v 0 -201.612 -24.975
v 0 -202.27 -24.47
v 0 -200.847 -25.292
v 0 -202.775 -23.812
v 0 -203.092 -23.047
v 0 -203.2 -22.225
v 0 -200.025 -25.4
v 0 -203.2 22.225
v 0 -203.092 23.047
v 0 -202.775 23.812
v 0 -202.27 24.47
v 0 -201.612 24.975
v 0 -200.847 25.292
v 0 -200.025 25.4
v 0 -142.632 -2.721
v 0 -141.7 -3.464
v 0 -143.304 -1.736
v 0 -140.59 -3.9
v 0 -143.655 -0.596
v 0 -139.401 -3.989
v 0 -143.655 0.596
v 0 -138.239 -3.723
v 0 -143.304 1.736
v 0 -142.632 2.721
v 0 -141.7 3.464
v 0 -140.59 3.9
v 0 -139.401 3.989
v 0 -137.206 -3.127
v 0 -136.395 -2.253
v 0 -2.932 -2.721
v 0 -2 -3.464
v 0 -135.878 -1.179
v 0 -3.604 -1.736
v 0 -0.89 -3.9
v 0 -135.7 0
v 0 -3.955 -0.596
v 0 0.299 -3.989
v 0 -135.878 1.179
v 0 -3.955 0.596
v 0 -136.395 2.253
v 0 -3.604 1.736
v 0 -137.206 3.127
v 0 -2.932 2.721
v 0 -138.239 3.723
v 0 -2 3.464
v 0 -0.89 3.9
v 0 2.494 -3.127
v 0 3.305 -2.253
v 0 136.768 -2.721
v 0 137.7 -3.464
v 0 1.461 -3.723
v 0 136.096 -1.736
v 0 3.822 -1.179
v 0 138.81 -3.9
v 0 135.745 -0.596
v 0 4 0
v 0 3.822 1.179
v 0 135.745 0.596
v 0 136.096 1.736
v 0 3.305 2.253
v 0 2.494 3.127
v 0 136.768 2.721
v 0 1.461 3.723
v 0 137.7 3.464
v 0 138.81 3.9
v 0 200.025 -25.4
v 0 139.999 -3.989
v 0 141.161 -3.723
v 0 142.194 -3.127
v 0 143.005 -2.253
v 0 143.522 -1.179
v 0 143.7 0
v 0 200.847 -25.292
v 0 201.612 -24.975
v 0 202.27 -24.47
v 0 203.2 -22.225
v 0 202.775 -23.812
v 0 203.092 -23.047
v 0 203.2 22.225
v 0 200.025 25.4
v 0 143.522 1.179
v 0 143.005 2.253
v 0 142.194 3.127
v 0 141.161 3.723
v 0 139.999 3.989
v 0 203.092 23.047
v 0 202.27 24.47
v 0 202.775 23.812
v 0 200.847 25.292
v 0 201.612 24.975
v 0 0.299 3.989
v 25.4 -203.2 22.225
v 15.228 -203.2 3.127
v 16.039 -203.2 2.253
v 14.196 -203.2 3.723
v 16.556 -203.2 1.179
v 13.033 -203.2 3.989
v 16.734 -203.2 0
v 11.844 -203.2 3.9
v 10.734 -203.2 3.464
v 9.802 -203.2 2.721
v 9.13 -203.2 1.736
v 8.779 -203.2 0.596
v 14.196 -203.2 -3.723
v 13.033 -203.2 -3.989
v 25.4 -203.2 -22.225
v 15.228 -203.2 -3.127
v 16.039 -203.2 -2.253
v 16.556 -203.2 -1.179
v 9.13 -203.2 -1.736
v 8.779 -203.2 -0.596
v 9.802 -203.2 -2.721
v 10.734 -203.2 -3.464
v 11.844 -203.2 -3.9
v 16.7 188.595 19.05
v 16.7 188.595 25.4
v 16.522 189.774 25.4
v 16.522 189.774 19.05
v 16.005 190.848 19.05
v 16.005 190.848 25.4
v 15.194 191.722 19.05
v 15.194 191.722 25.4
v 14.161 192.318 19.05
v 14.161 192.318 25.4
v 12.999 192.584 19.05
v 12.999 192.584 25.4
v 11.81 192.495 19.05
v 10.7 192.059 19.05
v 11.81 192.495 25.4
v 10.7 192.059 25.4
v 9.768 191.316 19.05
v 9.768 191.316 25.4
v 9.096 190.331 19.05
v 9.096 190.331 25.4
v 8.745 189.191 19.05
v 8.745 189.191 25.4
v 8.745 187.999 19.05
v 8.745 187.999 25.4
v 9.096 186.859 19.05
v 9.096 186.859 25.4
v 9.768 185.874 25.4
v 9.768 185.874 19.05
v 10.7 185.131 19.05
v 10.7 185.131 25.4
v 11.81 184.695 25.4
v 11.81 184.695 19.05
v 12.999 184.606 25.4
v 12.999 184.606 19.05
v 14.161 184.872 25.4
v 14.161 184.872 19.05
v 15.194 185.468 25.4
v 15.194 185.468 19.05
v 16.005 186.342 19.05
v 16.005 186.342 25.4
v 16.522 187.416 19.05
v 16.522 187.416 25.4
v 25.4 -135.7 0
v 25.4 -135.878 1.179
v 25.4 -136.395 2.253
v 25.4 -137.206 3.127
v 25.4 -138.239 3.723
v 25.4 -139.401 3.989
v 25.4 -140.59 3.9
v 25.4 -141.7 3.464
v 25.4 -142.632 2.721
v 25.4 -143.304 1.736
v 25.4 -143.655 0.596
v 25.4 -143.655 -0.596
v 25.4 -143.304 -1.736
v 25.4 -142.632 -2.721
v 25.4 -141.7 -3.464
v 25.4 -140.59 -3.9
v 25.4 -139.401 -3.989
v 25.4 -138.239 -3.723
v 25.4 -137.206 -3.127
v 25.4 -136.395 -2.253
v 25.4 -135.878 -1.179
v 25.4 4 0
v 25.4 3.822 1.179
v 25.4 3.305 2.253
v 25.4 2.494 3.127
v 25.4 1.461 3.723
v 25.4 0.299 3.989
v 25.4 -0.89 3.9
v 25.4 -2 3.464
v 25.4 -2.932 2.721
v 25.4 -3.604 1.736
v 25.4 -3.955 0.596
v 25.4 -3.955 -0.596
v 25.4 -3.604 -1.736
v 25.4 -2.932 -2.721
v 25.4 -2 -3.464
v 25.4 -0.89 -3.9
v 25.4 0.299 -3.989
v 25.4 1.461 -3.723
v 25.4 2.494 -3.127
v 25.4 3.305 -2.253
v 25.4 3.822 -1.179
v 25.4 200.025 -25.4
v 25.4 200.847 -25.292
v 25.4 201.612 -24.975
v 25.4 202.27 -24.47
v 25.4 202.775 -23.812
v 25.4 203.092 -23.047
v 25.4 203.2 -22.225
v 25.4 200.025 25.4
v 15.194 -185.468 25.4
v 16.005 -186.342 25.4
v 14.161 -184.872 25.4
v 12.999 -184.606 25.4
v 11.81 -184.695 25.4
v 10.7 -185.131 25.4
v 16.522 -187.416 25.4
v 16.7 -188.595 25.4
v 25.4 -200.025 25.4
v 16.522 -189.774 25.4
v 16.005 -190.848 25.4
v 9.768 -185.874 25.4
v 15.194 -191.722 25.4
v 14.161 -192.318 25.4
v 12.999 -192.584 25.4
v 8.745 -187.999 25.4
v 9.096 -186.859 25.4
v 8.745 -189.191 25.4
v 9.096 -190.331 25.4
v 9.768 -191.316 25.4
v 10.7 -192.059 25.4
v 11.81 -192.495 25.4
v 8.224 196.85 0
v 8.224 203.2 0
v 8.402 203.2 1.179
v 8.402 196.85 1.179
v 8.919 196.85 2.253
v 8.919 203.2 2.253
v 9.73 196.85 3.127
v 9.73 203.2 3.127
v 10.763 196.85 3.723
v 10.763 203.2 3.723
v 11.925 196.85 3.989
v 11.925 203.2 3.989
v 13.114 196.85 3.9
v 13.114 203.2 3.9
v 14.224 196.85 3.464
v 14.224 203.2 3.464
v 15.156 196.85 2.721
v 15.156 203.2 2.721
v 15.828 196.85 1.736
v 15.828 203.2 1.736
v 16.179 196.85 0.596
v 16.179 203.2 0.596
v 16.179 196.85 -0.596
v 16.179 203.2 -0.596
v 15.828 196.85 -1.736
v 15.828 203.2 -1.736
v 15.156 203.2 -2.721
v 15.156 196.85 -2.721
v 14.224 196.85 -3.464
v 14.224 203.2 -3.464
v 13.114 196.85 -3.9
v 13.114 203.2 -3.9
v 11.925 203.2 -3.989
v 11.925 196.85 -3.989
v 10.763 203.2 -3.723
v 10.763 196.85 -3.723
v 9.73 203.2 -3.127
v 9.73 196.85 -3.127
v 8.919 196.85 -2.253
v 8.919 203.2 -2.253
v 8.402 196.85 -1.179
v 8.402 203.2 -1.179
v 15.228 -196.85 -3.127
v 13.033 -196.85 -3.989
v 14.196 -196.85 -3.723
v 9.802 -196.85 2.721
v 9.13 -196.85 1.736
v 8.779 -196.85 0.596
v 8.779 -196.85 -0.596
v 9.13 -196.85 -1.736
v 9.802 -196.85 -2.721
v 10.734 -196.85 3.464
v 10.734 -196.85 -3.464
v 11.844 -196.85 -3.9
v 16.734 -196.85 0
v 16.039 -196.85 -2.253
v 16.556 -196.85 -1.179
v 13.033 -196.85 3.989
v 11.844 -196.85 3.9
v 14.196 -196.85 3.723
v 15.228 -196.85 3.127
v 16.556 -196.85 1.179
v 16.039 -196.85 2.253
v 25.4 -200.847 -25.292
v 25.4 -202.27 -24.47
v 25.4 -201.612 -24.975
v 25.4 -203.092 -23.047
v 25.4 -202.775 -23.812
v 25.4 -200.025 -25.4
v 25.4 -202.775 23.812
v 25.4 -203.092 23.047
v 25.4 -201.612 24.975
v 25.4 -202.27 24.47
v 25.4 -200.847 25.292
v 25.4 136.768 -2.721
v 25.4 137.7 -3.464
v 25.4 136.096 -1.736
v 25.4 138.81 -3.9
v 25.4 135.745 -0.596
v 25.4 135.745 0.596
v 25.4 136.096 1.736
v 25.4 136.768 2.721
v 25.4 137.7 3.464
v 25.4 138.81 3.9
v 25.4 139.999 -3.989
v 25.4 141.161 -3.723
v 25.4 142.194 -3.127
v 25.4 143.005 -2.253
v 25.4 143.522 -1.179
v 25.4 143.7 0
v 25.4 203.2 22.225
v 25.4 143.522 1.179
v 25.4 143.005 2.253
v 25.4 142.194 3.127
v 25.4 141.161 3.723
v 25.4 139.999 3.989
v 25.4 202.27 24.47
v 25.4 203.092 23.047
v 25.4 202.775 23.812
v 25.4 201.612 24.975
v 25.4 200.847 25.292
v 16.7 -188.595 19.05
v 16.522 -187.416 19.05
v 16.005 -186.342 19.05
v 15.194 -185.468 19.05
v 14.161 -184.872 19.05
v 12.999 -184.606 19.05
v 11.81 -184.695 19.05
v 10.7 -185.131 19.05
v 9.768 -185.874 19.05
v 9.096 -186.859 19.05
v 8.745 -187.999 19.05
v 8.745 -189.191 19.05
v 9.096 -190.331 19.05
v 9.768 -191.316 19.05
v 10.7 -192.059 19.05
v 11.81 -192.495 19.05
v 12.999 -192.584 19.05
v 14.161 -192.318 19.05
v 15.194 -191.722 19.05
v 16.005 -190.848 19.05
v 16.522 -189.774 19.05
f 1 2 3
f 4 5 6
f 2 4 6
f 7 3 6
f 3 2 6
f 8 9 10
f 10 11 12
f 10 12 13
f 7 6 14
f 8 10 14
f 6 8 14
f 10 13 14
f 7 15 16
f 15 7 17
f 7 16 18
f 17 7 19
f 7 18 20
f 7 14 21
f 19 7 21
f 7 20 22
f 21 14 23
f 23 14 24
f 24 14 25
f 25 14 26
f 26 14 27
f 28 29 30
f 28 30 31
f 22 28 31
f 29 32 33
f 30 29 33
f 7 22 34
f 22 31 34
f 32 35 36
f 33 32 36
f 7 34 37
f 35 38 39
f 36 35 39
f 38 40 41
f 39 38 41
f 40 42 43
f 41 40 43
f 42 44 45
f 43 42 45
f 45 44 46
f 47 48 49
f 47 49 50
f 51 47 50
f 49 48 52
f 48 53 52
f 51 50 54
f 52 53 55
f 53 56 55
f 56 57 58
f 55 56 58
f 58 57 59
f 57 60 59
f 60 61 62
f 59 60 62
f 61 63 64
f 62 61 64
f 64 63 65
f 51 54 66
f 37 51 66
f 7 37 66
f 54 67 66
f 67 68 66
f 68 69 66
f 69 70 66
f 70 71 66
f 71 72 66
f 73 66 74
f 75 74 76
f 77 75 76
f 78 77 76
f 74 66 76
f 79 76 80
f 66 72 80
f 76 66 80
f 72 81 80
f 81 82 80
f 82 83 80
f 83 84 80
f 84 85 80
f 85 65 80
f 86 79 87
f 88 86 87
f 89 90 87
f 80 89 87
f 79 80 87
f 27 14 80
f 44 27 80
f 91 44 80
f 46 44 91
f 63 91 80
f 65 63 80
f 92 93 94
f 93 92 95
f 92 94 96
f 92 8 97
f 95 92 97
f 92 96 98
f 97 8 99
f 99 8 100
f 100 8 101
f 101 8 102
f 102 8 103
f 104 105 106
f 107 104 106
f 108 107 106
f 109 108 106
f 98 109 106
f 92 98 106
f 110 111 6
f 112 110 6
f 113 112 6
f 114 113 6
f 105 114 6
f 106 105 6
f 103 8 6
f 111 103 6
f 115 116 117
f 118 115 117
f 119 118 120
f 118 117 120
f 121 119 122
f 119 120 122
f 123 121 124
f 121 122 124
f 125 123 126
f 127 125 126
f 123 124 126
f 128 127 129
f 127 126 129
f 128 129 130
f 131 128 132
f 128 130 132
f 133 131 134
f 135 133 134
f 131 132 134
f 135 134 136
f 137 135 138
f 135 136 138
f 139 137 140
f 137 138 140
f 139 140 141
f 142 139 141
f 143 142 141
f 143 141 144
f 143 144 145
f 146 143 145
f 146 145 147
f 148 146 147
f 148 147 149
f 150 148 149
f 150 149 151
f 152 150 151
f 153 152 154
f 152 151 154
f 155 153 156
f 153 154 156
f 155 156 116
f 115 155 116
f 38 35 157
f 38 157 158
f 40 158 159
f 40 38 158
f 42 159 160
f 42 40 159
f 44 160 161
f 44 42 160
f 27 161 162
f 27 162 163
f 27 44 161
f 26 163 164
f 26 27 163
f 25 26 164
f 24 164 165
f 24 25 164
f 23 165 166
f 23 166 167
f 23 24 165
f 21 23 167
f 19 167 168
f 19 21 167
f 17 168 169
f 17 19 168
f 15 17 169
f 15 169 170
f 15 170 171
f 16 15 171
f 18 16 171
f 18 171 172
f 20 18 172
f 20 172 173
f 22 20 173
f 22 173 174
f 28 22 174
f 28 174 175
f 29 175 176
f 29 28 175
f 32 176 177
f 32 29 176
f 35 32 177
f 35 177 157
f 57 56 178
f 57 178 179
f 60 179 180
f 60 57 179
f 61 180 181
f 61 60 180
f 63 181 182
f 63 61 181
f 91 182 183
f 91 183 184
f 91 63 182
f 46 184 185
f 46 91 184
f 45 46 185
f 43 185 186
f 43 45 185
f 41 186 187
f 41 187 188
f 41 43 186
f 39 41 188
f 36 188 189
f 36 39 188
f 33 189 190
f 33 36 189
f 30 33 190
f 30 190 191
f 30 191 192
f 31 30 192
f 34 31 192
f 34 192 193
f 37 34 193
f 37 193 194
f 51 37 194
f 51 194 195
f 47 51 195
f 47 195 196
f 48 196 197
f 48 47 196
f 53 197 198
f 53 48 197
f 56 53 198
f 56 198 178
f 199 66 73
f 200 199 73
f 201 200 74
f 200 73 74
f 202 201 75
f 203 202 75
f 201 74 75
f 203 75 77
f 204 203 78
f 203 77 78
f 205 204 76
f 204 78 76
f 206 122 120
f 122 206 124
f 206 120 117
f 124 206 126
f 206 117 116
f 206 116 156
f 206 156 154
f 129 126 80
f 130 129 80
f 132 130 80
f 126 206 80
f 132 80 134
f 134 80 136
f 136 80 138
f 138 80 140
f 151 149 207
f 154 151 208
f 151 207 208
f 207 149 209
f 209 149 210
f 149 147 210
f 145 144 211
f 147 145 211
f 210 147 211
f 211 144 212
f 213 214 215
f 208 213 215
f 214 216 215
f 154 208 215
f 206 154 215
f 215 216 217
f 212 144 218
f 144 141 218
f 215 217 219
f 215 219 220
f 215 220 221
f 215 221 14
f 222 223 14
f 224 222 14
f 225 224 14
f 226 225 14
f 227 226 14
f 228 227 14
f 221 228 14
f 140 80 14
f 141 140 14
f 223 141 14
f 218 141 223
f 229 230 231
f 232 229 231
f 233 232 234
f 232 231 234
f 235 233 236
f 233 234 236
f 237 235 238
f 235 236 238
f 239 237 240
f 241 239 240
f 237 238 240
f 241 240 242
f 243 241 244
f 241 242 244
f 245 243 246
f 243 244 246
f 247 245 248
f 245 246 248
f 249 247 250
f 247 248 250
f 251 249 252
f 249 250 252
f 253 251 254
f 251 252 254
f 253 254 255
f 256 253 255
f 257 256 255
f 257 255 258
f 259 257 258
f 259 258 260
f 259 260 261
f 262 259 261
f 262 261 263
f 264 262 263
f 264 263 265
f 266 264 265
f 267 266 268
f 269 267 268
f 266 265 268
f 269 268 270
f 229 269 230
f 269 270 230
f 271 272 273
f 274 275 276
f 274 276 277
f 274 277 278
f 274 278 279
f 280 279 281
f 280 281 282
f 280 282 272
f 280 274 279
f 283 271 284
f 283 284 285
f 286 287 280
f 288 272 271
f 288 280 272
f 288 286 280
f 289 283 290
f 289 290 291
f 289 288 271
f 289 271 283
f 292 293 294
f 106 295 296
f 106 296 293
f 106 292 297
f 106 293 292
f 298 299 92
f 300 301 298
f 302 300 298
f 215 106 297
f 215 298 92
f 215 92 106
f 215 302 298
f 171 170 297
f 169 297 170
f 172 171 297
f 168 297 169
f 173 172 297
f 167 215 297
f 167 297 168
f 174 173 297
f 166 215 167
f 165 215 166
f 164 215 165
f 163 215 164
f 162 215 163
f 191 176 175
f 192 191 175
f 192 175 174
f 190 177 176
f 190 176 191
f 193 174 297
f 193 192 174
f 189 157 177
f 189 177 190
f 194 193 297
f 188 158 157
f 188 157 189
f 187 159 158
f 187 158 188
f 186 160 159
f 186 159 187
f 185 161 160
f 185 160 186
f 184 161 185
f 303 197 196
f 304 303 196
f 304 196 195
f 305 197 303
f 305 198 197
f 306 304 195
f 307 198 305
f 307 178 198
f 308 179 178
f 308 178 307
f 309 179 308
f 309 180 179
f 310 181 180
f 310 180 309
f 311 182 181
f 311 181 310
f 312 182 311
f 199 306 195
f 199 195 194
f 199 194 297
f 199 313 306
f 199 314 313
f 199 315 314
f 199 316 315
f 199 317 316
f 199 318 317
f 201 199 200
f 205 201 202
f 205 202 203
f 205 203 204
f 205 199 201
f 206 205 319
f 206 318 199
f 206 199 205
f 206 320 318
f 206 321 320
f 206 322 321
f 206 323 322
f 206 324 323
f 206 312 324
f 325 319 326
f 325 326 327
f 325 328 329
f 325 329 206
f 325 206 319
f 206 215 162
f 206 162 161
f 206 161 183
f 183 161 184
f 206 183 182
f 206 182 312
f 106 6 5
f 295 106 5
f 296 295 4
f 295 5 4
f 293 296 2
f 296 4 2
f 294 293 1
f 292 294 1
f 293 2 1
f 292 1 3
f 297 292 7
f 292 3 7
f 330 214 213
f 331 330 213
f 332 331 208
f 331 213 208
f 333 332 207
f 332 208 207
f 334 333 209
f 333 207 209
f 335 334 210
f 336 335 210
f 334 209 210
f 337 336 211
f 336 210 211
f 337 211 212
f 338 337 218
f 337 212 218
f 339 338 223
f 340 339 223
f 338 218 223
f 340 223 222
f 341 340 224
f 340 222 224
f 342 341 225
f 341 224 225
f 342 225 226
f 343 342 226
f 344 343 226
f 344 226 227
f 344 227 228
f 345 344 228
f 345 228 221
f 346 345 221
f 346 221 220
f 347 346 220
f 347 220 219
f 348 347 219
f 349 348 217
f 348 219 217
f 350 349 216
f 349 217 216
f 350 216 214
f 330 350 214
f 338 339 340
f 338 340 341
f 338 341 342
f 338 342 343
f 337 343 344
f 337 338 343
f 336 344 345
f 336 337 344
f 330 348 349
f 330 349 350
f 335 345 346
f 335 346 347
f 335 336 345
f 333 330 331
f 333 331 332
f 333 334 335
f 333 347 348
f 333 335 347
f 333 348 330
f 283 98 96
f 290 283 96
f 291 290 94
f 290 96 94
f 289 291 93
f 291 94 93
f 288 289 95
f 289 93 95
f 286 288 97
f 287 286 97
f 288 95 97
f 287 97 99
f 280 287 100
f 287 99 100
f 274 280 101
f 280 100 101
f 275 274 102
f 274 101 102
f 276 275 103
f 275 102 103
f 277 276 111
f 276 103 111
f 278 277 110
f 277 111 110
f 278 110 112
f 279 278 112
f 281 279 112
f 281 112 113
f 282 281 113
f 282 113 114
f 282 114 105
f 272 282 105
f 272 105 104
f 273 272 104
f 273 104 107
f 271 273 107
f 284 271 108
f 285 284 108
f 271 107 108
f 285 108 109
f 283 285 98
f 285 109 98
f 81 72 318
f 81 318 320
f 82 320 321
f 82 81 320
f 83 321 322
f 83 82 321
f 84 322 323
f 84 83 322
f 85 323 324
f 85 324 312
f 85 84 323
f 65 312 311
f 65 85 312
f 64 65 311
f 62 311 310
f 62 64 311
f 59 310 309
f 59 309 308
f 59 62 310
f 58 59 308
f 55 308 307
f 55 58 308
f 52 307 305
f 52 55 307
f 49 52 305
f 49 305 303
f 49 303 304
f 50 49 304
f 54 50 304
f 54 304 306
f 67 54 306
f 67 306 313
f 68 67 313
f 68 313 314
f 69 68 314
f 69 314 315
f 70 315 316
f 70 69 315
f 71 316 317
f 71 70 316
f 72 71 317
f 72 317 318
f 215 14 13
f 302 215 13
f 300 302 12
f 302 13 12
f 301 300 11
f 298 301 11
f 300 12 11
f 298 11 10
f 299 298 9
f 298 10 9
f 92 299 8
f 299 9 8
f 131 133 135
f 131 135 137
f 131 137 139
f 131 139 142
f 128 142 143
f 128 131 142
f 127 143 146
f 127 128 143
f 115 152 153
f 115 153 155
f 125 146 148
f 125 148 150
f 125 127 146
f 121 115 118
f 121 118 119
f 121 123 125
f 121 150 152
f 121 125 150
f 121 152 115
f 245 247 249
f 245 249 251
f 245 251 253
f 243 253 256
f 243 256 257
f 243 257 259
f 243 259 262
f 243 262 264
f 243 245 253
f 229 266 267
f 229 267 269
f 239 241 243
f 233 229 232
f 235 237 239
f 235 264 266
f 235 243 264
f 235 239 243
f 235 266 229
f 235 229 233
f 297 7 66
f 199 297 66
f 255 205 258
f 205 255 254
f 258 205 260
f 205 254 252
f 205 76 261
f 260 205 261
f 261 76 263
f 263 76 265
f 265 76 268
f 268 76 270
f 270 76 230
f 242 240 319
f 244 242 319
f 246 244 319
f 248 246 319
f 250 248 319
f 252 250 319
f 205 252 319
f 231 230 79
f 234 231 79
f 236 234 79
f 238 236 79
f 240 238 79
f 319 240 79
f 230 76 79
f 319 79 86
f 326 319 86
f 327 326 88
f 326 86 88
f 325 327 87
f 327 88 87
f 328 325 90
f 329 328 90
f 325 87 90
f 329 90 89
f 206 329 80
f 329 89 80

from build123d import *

# Parameters (mm, degrees)
F0_R     = 4
F1_DEPTH = 25.4
F2_R     = 4
F3_DEPTH = 6.35
F4_R     = 4
F5_DEPTH = 6.35
F6_R     = 4
F7_DEPTH = 6.35
F8_R     = 4
F9_DEPTH = 6.35


with BuildPart() as f1:
    # F0 (on Right) → F1 (new body)
    with BuildSketch(Plane.YZ):
        with BuildLine():
            ThreePointArc((203.2, 22.225), (202.270064, 24.470064), (200.025, 25.4))
            Line((200.025, 25.4), (-200.025, 25.4))
            ThreePointArc((-200.025, 25.4), (-202.270064, 24.470064), (-203.2, 22.225))
            Line((-203.2, 22.225), (-203.2, -22.225))
            ThreePointArc((-203.2, -22.225), (-202.270064, -24.470064), (-200.025, -25.4))
            Line((-200.025, -25.4), (200.025, -25.4))
            ThreePointArc((200.025, -25.4), (202.270064, -24.470064), (203.2, -22.225))
            Line((203.2, -22.225), (203.2, 22.225))
        make_face()
        with Locations((-139.7, 0)):
            Circle(F0_R, mode=Mode.SUBTRACT)
        Circle(F0_R, mode=Mode.SUBTRACT)
        with Locations((139.7, 0)):
            Circle(F0_R, mode=Mode.SUBTRACT)
    extrude(amount=F1_DEPTH)

    # F2 (on face) → F3 (cut)
    with BuildSketch(Plane.XZ.offset(203.2)):
        with Locations((12.734205, 0)):
            Circle(F2_R)
    extrude(amount=-F3_DEPTH, mode=Mode.SUBTRACT)

    # F4 (on face) → F5 (cut)
    with BuildSketch(Plane(origin=(0, 203.2, 0), x_dir=(-1, 0, 0), z_dir=(0, 1, 0))):
        with Locations((-12.224027, 0)):
            Circle(F4_R)
    extrude(amount=-F5_DEPTH, mode=Mode.SUBTRACT)

    # F6 (on face) → F7 (cut)
    with BuildSketch(Plane.XY.offset(25.4)):
        with Locations((12.7, -188.595)):
            Circle(F6_R)
    extrude(amount=-F7_DEPTH, mode=Mode.SUBTRACT)

    # F8 (on face) → F9 (cut)
    with BuildSketch(Plane.XY.offset(25.4)):
        with Locations((12.7, 188.595)):
            Circle(F8_R)
    extrude(amount=-F9_DEPTH, mode=Mode.SUBTRACT)


solid = f1.part
